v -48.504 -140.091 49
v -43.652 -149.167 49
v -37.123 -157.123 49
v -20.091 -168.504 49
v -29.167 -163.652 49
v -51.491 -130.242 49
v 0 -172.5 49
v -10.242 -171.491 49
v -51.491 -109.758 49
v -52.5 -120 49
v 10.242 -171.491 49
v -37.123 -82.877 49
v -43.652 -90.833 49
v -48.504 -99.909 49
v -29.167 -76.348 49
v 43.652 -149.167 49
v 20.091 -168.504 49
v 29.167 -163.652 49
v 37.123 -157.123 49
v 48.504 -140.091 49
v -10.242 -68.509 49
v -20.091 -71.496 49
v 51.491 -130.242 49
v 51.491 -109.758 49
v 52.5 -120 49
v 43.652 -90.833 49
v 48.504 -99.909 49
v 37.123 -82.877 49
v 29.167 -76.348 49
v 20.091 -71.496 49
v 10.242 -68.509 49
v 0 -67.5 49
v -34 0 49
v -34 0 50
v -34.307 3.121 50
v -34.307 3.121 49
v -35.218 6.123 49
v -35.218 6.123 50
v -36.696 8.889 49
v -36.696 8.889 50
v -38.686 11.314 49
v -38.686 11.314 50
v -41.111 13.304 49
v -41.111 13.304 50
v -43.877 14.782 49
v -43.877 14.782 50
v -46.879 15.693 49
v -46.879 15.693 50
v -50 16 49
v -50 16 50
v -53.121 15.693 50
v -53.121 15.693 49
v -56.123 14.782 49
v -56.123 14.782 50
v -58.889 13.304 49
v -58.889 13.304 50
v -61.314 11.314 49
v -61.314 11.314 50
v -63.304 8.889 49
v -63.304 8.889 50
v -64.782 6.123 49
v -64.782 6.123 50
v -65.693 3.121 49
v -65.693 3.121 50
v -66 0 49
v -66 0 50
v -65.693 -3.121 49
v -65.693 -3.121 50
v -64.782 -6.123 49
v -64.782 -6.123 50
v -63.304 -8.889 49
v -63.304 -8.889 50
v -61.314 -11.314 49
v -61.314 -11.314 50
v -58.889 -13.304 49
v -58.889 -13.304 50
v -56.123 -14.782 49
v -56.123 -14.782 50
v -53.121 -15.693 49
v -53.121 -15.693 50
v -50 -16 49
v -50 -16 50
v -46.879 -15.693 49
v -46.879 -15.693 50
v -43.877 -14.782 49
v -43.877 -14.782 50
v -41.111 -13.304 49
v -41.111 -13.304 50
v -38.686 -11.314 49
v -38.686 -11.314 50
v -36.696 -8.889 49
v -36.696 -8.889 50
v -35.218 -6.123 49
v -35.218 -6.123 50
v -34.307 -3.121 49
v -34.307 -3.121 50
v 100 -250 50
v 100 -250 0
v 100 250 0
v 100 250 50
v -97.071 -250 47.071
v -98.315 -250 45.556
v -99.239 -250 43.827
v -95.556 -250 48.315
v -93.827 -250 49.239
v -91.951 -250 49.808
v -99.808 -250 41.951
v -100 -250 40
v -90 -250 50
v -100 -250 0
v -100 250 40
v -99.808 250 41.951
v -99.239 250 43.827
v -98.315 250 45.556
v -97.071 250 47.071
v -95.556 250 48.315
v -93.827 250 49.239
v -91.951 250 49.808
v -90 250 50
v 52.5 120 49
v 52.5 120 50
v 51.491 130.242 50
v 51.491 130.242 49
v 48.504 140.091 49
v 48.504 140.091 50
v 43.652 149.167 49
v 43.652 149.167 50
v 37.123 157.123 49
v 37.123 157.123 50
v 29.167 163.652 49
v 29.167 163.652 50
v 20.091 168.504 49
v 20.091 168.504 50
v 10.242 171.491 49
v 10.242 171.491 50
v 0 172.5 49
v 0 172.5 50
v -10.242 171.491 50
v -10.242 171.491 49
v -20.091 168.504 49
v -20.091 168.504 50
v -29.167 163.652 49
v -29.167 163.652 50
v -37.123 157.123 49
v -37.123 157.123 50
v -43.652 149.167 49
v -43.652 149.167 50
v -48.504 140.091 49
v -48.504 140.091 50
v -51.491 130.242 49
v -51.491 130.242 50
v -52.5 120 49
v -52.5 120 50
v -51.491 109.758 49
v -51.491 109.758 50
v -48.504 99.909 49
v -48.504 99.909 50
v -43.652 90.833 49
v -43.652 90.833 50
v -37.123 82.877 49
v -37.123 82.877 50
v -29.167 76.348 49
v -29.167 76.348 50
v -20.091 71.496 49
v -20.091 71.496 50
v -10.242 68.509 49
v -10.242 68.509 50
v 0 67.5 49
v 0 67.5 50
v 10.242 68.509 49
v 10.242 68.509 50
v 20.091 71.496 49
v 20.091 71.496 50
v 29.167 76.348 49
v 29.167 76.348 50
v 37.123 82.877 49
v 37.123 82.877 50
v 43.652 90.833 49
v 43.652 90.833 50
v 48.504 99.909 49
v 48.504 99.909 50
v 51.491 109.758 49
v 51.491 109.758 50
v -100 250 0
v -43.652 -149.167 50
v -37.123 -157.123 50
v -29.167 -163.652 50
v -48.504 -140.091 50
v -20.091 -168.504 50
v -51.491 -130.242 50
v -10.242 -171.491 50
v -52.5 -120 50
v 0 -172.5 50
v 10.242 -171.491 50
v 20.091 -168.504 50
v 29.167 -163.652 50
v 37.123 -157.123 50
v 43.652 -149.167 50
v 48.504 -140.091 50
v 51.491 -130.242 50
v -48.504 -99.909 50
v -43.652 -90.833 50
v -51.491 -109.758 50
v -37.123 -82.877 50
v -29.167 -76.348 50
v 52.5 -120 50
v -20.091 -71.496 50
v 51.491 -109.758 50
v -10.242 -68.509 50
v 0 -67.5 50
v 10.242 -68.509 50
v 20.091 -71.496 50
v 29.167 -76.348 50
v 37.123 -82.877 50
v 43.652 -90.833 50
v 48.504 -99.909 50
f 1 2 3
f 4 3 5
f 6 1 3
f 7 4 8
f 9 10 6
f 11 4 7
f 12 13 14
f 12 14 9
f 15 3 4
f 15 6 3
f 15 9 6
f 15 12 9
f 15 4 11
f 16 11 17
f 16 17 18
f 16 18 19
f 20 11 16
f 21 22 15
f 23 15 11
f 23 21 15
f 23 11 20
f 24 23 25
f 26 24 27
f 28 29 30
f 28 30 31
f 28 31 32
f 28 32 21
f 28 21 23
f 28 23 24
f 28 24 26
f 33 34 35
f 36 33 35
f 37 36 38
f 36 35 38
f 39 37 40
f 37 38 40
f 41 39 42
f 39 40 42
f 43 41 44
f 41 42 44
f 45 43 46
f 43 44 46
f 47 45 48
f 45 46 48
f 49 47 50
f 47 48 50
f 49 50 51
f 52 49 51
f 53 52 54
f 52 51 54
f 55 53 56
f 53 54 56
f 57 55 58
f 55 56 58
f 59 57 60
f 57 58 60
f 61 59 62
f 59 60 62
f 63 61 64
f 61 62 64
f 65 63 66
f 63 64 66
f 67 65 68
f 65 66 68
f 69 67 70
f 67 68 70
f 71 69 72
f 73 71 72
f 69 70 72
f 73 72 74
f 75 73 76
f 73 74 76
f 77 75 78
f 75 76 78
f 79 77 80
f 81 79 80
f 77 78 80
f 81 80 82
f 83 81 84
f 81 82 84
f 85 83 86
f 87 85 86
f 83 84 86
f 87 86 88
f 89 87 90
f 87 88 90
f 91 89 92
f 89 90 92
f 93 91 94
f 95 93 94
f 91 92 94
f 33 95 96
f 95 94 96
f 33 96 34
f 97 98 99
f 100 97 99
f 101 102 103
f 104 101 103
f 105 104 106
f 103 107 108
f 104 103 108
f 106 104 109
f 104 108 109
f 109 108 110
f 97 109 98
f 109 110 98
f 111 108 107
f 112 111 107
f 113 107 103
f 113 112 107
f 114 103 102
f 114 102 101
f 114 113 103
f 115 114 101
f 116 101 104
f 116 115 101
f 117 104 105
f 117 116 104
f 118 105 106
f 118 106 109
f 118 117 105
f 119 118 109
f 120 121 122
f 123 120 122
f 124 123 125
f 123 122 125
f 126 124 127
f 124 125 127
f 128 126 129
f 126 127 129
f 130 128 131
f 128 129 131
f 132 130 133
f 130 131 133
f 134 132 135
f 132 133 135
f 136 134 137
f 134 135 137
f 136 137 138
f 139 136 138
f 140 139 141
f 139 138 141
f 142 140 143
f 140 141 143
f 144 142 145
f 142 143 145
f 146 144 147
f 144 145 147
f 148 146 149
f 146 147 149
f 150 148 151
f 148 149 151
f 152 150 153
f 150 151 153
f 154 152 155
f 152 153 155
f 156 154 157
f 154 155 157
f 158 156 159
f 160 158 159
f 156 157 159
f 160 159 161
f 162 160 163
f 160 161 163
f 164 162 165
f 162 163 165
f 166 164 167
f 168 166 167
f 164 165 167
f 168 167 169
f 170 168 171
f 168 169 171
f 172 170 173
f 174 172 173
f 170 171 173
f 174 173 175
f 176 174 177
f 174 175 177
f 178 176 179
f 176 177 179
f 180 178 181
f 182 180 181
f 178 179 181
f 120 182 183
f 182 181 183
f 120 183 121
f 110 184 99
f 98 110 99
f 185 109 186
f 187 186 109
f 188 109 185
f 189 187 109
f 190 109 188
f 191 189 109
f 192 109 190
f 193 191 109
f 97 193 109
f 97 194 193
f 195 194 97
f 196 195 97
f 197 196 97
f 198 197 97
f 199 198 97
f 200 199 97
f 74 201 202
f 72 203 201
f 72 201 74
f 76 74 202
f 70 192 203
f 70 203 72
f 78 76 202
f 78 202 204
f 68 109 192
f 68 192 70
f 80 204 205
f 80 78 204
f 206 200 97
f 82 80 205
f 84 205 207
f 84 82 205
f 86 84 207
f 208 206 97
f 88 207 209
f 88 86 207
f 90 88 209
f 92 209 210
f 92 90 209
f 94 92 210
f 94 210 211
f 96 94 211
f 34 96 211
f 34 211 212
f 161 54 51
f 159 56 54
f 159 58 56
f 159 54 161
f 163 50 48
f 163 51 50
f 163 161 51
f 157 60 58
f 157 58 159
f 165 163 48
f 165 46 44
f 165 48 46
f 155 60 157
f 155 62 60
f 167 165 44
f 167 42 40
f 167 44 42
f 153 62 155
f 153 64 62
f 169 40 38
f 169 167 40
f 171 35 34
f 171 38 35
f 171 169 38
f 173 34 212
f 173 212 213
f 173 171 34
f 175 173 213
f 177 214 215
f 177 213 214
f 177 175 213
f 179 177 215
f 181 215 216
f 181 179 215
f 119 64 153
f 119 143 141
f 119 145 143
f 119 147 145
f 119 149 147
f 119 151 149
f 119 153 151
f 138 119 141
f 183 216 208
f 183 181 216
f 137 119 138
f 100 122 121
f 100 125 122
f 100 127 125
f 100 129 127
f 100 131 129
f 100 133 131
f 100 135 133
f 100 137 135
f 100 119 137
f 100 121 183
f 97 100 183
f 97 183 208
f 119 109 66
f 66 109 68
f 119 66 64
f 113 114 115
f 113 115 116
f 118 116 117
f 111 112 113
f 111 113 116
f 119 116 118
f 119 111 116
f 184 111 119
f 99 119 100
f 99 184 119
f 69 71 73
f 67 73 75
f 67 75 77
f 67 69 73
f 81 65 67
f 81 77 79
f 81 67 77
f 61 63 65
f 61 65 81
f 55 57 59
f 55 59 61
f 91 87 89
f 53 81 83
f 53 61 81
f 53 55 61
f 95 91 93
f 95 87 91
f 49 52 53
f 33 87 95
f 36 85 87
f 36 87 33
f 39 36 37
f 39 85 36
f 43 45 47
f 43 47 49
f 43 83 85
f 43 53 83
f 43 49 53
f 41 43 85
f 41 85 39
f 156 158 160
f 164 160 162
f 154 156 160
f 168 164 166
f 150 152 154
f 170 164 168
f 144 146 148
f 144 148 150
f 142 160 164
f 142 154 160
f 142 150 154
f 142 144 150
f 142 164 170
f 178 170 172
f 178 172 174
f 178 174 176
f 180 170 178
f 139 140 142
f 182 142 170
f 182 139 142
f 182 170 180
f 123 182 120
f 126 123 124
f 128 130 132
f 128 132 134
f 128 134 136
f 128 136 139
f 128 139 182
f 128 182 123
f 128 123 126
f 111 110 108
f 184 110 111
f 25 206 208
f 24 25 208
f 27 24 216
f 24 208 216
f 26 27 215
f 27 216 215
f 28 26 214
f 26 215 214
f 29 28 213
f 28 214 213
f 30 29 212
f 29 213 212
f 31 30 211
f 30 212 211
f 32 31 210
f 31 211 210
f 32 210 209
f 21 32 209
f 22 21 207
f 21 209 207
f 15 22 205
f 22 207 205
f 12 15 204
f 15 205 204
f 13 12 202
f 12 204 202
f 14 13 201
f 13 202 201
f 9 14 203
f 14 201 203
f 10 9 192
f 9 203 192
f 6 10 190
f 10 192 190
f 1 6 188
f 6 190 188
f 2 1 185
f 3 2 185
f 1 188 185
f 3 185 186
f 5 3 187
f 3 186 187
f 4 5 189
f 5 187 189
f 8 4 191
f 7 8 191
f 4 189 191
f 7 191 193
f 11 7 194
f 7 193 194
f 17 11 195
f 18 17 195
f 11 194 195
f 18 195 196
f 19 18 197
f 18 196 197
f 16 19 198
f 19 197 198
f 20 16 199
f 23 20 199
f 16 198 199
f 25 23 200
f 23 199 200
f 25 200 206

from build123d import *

# Parameters (mm, degrees)
SKETCH_W      = 200
SKETCH_H      = 500
PAD_DEPTH     = 50
SKETCH001_R   = 52.5
SKETCH001_R_2 = 16
POCKET_DEPTH  = 1
FILLET_R      = 10


with BuildPart() as part:
    # Sketch (on XY_Plane of Origin) → Pad (new body)
    with BuildSketch(Plane.XY):
        Rectangle(SKETCH_W, SKETCH_H)
    extrude(amount=PAD_DEPTH)

    # Sketch001 (on Face6 of Pad) → Pocket (cut)
    with BuildSketch(Plane.XY.offset(50)):
        with Locations((0, 120)):
            Circle(SKETCH001_R)
        with Locations((0, -120)):
            Circle(SKETCH001_R)
        with Locations((-50, 0)):
            Circle(SKETCH001_R_2)
    extrude(amount=-POCKET_DEPTH, mode=Mode.SUBTRACT)

    # Fillet
    fillet_edges = [part.edges().sort_by_distance(p)[0] for p in [
        (-100, 0, 50),
    ]]
    fillet(fillet_edges, radius=FILLET_R)


solid = part.part
